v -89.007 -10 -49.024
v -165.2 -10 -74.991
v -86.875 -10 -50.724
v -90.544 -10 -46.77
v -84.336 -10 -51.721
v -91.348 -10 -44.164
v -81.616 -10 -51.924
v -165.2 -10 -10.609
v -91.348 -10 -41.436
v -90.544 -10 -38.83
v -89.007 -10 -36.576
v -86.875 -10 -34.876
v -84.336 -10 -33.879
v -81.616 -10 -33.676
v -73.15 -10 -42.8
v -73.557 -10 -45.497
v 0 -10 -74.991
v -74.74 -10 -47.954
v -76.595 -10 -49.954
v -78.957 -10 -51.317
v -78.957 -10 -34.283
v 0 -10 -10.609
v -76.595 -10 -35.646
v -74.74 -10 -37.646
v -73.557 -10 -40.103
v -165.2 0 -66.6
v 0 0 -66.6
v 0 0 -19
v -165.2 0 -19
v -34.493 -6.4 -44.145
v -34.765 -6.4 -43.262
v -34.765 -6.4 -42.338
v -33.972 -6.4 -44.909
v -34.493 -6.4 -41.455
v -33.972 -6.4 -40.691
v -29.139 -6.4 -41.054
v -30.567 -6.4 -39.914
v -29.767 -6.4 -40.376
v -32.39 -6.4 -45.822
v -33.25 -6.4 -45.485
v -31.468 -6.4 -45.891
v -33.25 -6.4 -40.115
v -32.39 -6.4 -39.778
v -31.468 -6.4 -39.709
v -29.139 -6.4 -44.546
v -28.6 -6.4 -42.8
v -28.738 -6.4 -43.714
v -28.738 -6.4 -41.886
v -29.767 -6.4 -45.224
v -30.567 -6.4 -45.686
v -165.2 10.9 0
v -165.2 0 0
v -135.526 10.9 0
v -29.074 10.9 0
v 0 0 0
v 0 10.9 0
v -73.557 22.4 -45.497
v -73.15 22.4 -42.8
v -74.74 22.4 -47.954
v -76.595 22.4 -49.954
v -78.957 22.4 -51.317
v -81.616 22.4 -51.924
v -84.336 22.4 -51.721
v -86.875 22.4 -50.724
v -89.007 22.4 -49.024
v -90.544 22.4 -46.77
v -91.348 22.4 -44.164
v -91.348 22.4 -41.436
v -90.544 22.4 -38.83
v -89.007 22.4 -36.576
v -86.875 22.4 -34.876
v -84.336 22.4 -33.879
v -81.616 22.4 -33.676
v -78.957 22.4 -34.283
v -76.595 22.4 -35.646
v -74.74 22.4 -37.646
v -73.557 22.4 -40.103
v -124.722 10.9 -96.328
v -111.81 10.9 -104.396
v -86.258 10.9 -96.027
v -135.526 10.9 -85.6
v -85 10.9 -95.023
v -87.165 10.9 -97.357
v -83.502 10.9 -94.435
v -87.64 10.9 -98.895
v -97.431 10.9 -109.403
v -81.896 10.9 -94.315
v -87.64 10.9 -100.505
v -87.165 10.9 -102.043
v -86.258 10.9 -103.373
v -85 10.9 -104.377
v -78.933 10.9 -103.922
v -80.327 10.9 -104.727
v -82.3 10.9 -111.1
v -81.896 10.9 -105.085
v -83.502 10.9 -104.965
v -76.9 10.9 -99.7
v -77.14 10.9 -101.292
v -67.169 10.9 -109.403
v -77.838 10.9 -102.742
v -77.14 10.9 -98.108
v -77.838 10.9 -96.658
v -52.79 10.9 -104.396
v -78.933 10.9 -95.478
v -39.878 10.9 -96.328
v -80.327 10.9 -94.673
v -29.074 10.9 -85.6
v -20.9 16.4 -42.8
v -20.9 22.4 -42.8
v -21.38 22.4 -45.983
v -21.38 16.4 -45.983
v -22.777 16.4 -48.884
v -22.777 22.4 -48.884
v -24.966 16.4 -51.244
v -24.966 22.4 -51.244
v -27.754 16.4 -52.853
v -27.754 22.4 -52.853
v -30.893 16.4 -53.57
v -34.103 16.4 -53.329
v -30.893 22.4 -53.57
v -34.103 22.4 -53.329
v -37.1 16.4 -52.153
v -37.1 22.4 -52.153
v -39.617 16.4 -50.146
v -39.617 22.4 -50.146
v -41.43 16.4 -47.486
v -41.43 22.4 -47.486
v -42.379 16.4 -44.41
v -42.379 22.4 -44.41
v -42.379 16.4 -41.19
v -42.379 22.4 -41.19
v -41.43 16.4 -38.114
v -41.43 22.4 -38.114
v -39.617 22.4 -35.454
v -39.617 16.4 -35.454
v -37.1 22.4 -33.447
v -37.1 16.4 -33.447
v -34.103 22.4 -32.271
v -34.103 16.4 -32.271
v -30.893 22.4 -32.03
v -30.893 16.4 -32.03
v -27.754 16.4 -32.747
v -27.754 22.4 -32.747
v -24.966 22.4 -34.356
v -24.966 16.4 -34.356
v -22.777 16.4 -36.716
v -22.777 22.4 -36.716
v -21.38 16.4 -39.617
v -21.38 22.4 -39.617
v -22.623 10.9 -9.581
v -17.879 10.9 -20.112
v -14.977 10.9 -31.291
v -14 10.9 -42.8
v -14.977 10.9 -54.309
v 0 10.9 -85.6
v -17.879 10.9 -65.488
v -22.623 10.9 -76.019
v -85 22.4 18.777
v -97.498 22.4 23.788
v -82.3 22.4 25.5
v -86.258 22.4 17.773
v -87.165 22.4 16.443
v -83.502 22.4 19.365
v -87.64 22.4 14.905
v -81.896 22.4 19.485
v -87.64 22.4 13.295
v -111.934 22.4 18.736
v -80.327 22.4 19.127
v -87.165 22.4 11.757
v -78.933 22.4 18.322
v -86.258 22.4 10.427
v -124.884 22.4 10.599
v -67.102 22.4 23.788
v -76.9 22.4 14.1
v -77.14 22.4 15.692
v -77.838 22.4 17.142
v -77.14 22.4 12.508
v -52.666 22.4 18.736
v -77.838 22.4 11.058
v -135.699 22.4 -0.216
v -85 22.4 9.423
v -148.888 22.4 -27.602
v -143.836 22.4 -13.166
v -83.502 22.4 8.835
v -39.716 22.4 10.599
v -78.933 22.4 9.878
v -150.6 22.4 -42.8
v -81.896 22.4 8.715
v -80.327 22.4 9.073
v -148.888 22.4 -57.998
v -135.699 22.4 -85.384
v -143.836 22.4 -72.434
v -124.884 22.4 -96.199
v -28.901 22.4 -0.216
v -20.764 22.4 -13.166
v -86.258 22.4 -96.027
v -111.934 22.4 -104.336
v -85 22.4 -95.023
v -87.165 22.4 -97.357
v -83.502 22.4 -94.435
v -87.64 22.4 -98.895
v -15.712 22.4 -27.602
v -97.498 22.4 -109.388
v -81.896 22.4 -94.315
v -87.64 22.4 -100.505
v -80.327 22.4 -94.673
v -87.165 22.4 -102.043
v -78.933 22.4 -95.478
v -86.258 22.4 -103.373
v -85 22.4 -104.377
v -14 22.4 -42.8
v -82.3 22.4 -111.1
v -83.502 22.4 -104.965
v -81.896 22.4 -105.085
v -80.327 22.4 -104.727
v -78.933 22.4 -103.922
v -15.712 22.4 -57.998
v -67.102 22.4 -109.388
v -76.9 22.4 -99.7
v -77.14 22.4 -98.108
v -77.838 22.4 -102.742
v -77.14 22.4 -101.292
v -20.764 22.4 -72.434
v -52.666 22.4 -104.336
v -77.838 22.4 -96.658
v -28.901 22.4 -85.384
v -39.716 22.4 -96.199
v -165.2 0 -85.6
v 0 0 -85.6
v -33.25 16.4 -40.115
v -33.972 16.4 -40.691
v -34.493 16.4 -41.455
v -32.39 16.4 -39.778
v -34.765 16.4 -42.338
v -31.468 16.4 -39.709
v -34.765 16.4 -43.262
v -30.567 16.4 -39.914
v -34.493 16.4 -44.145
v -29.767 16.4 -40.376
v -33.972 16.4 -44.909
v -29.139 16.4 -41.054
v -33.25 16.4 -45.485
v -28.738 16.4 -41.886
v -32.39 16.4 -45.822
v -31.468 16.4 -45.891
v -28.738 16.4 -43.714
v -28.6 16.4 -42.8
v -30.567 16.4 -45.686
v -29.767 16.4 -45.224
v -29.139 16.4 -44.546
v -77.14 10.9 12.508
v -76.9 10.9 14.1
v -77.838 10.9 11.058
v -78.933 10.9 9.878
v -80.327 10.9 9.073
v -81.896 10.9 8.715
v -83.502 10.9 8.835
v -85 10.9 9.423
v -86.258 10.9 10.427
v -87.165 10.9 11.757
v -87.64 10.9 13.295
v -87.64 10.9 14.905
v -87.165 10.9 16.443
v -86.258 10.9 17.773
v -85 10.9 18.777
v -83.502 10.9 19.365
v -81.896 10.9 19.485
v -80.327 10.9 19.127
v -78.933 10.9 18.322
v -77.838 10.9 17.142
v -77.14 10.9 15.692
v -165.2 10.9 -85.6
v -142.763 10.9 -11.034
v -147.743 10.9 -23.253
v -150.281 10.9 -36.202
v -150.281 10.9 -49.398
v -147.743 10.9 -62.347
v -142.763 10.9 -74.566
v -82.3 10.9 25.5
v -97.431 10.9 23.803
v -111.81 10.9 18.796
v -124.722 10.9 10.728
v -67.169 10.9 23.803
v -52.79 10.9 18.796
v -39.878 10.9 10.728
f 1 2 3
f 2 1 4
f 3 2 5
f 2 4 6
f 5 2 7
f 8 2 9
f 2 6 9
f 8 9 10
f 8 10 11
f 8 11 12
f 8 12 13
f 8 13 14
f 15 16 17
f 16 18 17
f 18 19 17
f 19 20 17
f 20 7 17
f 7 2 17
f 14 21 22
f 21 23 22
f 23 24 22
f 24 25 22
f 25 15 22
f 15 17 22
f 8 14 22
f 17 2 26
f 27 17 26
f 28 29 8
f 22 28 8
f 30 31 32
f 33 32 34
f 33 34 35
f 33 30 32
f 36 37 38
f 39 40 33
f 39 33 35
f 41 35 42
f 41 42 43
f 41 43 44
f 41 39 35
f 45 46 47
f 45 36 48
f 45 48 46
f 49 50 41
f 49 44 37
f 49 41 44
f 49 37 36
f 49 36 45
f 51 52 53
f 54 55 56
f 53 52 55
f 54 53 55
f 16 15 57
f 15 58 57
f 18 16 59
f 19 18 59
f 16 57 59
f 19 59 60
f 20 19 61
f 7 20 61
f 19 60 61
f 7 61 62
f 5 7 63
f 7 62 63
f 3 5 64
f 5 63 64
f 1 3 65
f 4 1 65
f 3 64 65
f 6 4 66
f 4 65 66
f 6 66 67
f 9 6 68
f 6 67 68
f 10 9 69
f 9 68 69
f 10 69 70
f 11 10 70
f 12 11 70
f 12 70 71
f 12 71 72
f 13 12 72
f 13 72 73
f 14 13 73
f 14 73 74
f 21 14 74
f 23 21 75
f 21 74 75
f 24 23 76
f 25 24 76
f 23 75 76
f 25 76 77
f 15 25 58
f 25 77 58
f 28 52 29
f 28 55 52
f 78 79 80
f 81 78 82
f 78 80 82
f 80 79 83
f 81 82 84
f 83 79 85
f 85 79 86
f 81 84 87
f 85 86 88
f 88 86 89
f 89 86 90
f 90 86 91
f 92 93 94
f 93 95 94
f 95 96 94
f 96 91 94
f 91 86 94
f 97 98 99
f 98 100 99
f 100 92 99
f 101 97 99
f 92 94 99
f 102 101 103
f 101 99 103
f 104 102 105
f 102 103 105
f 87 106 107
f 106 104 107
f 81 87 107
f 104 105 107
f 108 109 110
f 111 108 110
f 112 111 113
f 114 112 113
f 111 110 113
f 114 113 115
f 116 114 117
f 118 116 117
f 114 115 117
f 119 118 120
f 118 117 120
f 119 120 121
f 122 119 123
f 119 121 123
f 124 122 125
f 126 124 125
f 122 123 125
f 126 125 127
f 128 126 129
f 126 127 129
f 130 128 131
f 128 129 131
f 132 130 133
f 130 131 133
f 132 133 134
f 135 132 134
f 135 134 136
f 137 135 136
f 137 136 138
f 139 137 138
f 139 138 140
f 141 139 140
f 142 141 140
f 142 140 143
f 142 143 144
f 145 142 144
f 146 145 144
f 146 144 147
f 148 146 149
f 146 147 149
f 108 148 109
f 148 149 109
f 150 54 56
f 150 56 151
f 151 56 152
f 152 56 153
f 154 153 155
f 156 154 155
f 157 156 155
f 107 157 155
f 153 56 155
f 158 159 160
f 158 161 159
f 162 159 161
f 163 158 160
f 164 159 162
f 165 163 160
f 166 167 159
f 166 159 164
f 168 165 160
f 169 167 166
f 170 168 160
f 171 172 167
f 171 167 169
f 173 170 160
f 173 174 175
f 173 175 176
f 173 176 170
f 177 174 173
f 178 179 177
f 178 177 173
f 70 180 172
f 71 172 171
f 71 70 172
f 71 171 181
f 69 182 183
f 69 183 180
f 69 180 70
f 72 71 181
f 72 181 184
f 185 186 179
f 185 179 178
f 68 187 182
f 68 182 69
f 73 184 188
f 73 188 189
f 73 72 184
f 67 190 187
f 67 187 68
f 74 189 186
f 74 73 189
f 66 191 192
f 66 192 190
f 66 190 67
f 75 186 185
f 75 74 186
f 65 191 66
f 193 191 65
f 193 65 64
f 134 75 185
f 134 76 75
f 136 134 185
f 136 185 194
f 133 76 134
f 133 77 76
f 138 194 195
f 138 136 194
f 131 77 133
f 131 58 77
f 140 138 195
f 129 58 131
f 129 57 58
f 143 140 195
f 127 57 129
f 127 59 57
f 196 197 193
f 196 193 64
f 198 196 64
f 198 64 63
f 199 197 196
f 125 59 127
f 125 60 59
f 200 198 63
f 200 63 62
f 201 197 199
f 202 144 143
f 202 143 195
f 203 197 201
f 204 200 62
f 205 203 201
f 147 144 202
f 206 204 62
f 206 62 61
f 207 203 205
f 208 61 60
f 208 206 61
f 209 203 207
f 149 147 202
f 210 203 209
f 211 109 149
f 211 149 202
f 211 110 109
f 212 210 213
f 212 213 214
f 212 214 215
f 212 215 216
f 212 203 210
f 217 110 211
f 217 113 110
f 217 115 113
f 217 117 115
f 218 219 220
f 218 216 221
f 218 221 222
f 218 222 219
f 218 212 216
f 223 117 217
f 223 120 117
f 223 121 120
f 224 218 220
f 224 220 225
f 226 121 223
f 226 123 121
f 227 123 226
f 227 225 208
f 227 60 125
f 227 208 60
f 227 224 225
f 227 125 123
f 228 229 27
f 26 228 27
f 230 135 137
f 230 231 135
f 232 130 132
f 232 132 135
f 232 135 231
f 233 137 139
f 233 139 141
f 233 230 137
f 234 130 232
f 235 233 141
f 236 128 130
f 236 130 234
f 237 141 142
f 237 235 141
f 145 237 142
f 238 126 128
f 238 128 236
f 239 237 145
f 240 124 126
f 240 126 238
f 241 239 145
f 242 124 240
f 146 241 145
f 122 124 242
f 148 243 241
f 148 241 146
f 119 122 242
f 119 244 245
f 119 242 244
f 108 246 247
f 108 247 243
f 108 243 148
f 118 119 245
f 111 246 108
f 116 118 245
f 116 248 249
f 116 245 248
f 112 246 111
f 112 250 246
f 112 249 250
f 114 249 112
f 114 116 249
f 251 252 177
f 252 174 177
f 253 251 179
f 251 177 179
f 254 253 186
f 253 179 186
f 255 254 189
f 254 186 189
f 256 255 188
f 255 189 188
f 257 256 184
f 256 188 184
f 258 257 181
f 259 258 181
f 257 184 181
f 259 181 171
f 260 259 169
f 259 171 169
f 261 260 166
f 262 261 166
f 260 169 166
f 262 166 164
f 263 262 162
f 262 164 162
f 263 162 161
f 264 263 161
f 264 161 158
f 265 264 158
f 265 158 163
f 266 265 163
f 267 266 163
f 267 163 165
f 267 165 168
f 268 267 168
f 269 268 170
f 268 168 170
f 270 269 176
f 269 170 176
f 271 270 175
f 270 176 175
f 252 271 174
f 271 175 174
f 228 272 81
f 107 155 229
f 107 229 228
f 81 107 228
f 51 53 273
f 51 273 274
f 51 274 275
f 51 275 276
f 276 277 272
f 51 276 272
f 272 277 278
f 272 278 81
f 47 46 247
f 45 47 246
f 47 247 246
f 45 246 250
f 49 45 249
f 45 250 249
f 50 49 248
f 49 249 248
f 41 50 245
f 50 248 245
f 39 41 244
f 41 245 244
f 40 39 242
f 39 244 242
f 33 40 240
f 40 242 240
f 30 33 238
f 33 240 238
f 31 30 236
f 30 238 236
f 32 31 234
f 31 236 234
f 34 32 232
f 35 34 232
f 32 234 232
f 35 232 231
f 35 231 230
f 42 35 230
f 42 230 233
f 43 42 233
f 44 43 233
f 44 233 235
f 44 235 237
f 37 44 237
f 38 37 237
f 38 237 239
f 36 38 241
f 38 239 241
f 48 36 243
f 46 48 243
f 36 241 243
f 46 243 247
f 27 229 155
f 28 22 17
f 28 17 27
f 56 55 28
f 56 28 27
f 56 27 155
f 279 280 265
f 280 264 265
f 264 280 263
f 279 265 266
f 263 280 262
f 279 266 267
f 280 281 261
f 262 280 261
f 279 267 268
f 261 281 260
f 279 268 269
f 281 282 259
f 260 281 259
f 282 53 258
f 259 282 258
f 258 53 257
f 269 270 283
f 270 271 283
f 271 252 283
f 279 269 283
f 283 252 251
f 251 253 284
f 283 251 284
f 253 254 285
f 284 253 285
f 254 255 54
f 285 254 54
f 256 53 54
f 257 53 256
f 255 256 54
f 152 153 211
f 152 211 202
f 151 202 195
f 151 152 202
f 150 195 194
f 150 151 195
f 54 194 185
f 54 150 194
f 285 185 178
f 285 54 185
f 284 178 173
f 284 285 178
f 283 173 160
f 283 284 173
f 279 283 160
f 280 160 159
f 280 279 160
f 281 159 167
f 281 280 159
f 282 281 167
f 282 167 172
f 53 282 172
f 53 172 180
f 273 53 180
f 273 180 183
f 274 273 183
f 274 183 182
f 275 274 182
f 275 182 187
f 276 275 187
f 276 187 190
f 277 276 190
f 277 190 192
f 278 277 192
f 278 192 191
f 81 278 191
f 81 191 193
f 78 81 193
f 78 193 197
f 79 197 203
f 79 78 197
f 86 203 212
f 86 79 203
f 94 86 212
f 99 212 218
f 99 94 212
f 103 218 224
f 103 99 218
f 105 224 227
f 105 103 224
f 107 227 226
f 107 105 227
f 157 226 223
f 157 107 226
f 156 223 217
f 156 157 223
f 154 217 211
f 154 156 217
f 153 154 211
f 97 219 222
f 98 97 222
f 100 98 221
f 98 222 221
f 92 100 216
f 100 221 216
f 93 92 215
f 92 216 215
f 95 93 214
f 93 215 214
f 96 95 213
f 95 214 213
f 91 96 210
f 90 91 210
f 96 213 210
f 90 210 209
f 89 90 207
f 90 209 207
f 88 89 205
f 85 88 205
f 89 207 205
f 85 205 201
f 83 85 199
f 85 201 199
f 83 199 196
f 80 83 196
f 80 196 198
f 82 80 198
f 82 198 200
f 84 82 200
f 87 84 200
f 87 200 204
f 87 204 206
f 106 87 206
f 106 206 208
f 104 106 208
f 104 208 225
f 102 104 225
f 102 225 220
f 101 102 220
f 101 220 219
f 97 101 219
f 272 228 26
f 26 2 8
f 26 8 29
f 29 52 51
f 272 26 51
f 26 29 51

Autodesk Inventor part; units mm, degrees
ref_plane "YZ Plane" through (0, 0, 0) normal (1, 0, 0) x (0, 1, 0)
ref_plane "XZ Plane" through (0, 0, 0) normal (0, 1, 0) x (-1, 0, 0)
ref_plane "XY Plane" through (0, 0, 0) normal (0, 0, 1) x (1, 0, 0)
sketch "Sketch1" plane through (0, 0, 0) normal (1, 0, 0) x (0, 1, 0)
  line L0 (0, 0) -> (10.9, 0)
  line L1 (10.9, 0) -> (10.9, -85.6)
  line L2 (10.9, -85.6) -> (0, -85.6)
  line L3 (0, -85.6) -> (0, -66.6)
  line L4 (-10, -74.991) -> (-10, -10.609)
  line L5 (-10, -74.991) -> (0, -66.6)
  line L6 (0, 0) -> (0, -19)
  line L7 (0, -19) -> (-10, -10.609)
  line L8 (0, -66.6) -> (0, -19)
  line L9 (0, -42.8) -> (-10, -42.8) construction
  dimension "d1" = 85.6
  dimension "d7" = 19
  dimension "d30" = 50
  dimension "d31" = 19
  dimension "d32" = 50
  dimension "d33" = 10
extrude "Extrusion1" add sketch "Sketch1" against normal blind 165.2
sketch "Sketch2" plane through (0, 10.9, 0) normal (0, 1, 0) x (1, 0, 0)
  point P0 (0, 0)
sketch "Sketch3" plane through (0, 10.9, 0) normal (0, 1, 0) x (1, 0, 0)
  line L0 (0, 0) -> (0, 85.6) projected
  line L1 (0, 42.8) -> (-14, 42.8)
  line L2 (-14, 42.8) -> (-82.3, 42.8)
  circle A0 centre (-82.3, 42.8) radius 68.3
  dimension "d10" = 14
  dimension "d11" = 68.3
extrude "Extrusion2" add sketch "Sketch3" along normal blind 11.5
sketch "Sketch4" plane through (-82.3, 22.4, -42.8) normal (0, 1, 0) x (1, 0, 0)
  circle A0 centre (0, 0) radius 9.15
  point P0 (82.3, -42.8)
  dimension "d14" = 18.3
extrude "Extrusion3" cut sketch "Sketch4" against normal blind 73.75
sketch "Sketch5" plane through (-82.3, 22.4, -42.8) normal (0, 1, 0) x (1, 0, 0)
  circle A0 centre (0, 0) radius 68.3 projected
  line L0 (0, 68.3) -> (0, 62.3)
  line L1 (0, -68.3) -> (0, -62.3)
  line L2 (0, 62.3) -> (0, 56.9)
  circle A1 centre (0, 56.9) radius 5.4
  line L3 (0, -62.3) -> (0, -56.9)
  line L4 (82.3, -32.191) -> (-82.9, -32.191) projected
  circle A2 centre (0, -56.9) radius 5.4
  point P0 (82.3, -42.8)
  dimension "d17" = 6
  dimension "d18" = 6
  dimension "d19" = 5.4
  dimension "d20" = 5.4
extrude "Extrusion4" cut sketch "Sketch5" against normal blind 73.75 contours A1 | A2
sketch "Sketch6" plane through (-82.3, 22.4, -42.8) normal (0, 1, 0) x (1, 0, 0)
  point P0 (82.3, -42.8)
sketch "Sketch7" plane through (-82.3, 22.4, -42.8) normal (0, 1, 0) x (1, 0, 0)
  circle A0 centre (0, 0) radius 68.3 projected
  line L0 (68.3, 0) -> (61.4, 0)
  line L1 (61.4, 0) -> (50.6, 0)
  circle A1 centre (50.6, 0) radius 10.8
  point P0 (82.3, -42.8)
  dimension "d23" = 6.9
  dimension "d24" = 10.8
extrude "Extrusion5" cut sketch "Sketch7" against normal blind 6 contours A1
sketch "Sketch8" plane through (-31.7, 16.4, -42.8) normal (0, 1, 0) x (1, 0, 0)
  circle A0 centre (0, 0) radius 3.1
  point P0 (31.7, -42.8)
  dimension "d27" = 6.2
extrude "Extrusion6" cut sketch "Sketch8" against normal blind 22.8
ref_plane "Work Plane1" through (0, 0, -42.8) normal (0, 0, -1) x (-1, 0, 0)
properties part number "Top Part Tool bit"
